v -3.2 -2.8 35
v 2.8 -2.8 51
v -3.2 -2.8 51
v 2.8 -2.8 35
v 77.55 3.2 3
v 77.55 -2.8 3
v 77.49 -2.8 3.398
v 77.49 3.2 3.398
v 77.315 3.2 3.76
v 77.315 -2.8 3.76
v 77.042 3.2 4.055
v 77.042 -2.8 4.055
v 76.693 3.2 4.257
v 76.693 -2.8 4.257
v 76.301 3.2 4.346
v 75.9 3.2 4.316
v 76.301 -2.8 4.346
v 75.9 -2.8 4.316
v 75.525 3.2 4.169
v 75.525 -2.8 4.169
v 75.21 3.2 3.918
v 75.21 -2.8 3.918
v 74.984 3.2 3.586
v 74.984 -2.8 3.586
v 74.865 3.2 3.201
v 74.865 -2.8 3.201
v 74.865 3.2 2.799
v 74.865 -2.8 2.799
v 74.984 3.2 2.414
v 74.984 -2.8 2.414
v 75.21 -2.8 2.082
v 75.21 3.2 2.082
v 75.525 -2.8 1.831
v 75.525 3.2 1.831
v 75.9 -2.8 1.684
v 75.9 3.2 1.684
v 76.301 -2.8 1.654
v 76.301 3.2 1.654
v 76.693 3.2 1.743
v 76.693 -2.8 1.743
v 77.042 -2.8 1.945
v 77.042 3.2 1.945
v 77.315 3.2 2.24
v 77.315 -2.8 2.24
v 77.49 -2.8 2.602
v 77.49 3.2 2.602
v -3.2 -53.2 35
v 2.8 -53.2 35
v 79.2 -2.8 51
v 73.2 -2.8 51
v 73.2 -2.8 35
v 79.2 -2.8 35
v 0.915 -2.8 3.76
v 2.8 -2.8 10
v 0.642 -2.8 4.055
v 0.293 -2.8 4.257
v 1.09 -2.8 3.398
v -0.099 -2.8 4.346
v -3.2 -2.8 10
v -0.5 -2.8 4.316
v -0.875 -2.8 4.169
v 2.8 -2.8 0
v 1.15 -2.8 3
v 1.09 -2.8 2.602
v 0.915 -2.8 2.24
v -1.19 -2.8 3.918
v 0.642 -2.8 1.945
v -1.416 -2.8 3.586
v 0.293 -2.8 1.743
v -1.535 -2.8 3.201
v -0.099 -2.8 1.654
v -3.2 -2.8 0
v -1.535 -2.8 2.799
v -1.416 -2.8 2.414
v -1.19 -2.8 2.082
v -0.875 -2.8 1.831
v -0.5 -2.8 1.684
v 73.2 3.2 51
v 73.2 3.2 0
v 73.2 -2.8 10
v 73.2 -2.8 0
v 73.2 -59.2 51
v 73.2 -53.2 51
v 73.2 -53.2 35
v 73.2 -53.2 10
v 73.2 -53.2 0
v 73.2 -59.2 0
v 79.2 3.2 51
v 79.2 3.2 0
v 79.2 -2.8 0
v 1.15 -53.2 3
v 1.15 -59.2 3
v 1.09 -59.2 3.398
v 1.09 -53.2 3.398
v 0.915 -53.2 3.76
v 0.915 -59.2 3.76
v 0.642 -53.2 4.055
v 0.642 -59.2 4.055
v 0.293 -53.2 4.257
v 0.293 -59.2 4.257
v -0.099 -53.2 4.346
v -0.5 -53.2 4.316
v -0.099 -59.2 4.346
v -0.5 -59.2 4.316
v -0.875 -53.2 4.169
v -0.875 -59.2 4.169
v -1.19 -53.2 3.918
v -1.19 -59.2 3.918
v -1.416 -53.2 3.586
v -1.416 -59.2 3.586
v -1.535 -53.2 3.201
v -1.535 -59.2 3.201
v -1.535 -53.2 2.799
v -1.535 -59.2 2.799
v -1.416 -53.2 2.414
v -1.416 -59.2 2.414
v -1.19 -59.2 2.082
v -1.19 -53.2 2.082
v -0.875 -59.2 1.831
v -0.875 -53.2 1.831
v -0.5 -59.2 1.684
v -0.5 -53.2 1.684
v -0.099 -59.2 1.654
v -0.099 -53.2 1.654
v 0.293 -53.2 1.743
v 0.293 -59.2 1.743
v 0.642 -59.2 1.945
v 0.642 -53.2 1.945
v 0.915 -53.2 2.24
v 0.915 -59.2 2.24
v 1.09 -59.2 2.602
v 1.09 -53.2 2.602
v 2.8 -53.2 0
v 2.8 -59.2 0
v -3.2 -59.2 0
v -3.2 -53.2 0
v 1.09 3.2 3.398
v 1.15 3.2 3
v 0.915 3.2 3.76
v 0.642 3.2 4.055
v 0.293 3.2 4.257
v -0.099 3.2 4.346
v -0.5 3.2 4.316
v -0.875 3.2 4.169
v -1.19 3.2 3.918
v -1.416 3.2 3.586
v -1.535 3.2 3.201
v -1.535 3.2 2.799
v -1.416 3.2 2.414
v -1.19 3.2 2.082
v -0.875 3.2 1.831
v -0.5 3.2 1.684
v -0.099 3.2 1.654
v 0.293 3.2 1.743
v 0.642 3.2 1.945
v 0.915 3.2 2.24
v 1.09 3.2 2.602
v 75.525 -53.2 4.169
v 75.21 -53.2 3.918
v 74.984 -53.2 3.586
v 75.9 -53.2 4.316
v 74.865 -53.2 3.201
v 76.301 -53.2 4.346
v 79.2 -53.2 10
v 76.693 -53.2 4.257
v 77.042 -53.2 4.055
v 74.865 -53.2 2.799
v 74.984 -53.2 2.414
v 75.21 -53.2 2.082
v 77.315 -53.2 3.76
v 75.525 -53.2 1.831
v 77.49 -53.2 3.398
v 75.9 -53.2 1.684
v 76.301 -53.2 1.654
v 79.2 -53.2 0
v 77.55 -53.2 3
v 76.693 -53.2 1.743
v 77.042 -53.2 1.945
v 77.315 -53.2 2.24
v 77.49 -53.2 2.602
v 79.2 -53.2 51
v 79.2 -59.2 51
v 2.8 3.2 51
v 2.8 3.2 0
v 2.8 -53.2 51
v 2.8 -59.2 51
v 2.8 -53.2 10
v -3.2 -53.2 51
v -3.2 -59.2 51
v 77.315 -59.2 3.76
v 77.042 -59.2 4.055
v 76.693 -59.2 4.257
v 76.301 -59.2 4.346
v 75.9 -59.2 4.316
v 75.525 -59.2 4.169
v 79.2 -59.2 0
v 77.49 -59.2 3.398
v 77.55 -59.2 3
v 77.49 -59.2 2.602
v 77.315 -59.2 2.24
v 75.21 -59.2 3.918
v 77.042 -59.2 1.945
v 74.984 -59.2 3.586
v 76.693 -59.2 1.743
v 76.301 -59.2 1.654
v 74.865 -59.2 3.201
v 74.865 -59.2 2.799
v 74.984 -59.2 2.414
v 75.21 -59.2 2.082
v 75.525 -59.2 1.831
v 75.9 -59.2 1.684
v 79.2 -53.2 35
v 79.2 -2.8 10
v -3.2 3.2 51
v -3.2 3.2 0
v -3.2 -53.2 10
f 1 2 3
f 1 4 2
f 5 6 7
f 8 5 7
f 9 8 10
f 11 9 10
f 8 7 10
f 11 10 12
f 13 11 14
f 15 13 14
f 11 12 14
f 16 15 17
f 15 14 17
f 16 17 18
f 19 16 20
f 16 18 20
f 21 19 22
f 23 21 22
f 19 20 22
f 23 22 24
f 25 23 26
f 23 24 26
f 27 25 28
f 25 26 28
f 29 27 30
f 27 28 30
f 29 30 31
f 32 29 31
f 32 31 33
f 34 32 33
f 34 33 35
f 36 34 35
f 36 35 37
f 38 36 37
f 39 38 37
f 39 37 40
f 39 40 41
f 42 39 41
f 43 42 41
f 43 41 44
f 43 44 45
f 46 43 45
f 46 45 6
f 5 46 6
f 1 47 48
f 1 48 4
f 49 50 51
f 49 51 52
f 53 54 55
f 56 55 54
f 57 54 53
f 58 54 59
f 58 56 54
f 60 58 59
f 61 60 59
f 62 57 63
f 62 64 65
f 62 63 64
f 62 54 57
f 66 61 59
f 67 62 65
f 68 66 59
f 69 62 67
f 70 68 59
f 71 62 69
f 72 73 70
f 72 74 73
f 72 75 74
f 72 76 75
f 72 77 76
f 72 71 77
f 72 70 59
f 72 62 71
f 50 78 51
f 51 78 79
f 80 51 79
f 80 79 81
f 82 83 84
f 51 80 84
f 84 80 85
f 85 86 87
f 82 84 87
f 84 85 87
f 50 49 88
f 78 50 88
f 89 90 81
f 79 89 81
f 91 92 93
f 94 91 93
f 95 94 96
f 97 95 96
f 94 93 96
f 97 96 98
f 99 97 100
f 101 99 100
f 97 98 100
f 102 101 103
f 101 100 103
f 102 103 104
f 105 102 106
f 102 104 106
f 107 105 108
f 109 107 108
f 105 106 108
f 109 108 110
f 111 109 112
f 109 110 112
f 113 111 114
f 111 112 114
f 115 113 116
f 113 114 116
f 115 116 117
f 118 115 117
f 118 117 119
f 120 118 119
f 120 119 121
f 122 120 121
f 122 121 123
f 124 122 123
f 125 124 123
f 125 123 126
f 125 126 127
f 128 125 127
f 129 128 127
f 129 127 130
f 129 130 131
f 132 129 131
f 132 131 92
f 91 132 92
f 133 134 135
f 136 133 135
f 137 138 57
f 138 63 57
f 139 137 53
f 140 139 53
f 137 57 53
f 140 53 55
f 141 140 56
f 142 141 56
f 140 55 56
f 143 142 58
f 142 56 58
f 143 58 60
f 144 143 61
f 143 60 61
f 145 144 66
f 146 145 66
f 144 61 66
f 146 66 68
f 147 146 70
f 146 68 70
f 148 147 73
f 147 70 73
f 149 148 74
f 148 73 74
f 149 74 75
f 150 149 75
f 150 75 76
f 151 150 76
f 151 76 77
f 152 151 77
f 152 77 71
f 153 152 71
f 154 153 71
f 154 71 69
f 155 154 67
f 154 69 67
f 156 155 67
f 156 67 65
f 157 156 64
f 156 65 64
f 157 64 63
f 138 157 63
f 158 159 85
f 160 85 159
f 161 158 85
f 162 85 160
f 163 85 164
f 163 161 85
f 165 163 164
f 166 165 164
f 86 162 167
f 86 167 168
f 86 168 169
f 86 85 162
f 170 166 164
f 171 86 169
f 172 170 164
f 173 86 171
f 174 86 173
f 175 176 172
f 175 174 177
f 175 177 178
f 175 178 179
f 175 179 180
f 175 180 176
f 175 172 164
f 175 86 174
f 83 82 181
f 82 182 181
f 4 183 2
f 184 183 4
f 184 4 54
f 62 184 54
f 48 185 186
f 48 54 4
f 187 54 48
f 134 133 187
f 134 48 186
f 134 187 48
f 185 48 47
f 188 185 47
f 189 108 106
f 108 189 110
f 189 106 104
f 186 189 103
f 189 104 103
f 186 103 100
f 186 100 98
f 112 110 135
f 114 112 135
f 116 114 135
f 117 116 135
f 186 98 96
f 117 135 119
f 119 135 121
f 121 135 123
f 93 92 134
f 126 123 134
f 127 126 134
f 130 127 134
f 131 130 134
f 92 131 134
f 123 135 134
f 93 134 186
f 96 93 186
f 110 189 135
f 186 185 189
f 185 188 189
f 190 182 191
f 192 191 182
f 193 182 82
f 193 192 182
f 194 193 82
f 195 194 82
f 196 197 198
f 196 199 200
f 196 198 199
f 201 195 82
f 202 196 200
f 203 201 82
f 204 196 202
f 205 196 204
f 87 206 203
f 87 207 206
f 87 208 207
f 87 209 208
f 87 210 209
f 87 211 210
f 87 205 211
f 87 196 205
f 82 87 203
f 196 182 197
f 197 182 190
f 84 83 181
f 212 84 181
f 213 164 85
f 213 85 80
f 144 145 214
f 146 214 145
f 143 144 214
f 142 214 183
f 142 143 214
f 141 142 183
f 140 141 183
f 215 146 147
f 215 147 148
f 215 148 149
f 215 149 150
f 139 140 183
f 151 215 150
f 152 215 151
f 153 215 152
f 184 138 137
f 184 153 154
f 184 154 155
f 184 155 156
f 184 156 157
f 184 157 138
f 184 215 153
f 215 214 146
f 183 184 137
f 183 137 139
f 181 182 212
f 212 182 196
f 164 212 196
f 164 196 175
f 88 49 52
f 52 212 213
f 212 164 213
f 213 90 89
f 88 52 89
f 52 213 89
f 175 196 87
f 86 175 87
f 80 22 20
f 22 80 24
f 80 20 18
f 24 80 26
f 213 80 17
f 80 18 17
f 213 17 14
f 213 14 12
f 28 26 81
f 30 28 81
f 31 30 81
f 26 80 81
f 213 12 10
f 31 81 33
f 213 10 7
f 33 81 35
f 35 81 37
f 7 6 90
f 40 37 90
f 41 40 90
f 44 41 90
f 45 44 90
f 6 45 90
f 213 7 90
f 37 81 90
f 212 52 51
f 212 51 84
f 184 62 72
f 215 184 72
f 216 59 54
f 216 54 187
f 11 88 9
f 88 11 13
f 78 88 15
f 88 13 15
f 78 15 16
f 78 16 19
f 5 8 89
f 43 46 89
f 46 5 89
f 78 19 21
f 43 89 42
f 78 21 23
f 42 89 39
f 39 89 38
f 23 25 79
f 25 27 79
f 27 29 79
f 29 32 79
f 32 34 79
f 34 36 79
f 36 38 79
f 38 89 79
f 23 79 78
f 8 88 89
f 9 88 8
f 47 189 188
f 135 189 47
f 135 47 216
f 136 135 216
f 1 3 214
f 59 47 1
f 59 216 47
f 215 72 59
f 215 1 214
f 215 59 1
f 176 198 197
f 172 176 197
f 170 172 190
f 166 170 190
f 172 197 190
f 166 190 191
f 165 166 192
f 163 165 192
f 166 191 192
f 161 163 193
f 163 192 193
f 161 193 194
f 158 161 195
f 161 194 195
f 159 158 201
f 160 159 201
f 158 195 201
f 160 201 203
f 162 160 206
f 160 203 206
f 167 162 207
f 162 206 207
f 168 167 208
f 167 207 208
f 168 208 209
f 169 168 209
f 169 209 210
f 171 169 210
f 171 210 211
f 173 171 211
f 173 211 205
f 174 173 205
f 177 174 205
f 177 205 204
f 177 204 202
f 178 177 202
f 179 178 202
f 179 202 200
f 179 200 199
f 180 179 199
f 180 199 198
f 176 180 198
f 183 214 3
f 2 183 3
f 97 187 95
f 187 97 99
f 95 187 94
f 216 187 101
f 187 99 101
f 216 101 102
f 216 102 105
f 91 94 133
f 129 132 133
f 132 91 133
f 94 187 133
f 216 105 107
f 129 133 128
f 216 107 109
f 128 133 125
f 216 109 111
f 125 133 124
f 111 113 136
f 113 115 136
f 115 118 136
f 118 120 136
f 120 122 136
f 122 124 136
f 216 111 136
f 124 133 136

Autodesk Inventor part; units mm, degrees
ref_plane "YZ Plane" through (0, 0, 0) normal (1, 0, 0) x (0, 1, 0)
ref_plane "XZ Plane" through (0, 0, 0) normal (0, 1, 0) x (-1, 0, 0)
ref_plane "XY Plane" through (0, 0, 0) normal (0, 0, 1) x (1, 0, 0)
sketch "스케치1" plane through (0, 0, 0) normal (0, 0, 1) x (1, 0, 0)
  circle A0 centre (7.2, -7.2) radius 1.6 projected
  circle A1 centre (68.8, -7.2) radius 1.6 projected
  circle A2 centre (7.2, -48.8) radius 1.6 projected
  circle A3 centre (68.8, -48.8) radius 1.6 projected
  line L0 (73, -3) -> (3, -3) projected
  line L1 (3, -3) -> (3, -53) projected
  line L2 (3, -53) -> (73, -53) projected
  line L3 (73, -53) -> (73, -3) projected
  line L4 (22.5584, -24.5391) -> (23.3691, -24.5391) projected
  line L5 (23.3691, -24.5391) -> (23.3691, -29.9174) projected
  line L6 (23.3691, -29.9174) -> (25.4156, -29.9174) projected
  line L7 (25.4156, -29.9174) -> (25.4156, -30.6391) projected
  line L8 (25.4156, -30.6391) -> (20.5118, -30.6391) projected
  line L9 (20.5118, -30.6391) -> (20.5118, -29.9174) projected
  line L10 (20.5118, -29.9174) -> (22.5584, -29.9174) projected
  line L11 (22.5584, -29.9174) -> (22.5584, -24.5391) projected
  spline S0 degree 2 poles (29.6668, -24.9741) (29.9584, -24.6874) (30.7296, -24.4106) (31.2931, -24.4106) knots 0 0 0 1 2 2 2 projected
  spline S1 degree 2 poles (31.2931, -24.4106) (31.8319, -24.4106) (32.6328, -24.6924) (32.9145, -24.9741) knots 0 0 0 1 2 2 2 projected
  spline S2 degree 2 poles (32.9145, -24.9741) (33.2358, -25.2905) (33.4978, -26.1803) (33.4978, -26.8328) knots 0 0 0 1 2 2 2 projected
  line L12 (33.4978, -26.8328) -> (33.4978, -30.6391) projected
  line L13 (33.4978, -30.6391) -> (32.6871, -30.6391) projected
  line L14 (32.6871, -30.6391) -> (32.6871, -26.8328) projected
  spline S3 degree 2 poles (32.6871, -26.8328) (32.6871, -26.4077) (32.5784, -25.8343) (32.4251, -25.6019) knots 0 0 0 1 2 2 2 projected
  spline S4 degree 2 poles (32.4251, -25.6019) (32.262, -25.3548) (31.6985, -25.1027) (31.2931, -25.1027) knots 0 0 0 1 2 2 2 projected
  spline S5 degree 2 poles (31.2931, -25.1027) (30.9125, -25.1027) (30.3193, -25.3548) (30.1562, -25.6019) knots 0 0 0 1 2 2 2 projected
  spline S6 degree 2 poles (30.1562, -25.6019) (30.0029, -25.8343) (29.8942, -26.4028) (29.8942, -26.813) knots 0 0 0 1 2 2 2 projected
  line L15 (29.8942, -26.813) -> (29.8942, -30.6391) projected
  line L16 (29.8942, -30.6391) -> (29.0835, -30.6391) projected
  line L17 (29.0835, -30.6391) -> (29.0835, -26.8328) projected
  spline S7 degree 2 poles (29.0835, -26.8328) (29.0835, -26.1951) (29.3405, -25.2856) (29.6668, -24.9741) knots 0 0 0 1 2 2 2 projected
  line L18 (44.6696, -25.162) -> (44.6696, -24.5391) projected
  line L19 (44.6696, -24.5391) -> (47.0325, -24.5391) projected
  line L20 (47.0325, -24.5391) -> (47.0325, -25.162) projected
  line L21 (47.0325, -25.162) -> (46.2564, -25.162) projected
  line L22 (46.2564, -25.162) -> (46.2564, -30.0163) projected
  line L23 (46.2564, -30.0163) -> (47.0325, -30.0163) projected
  line L24 (47.0325, -30.0163) -> (47.0325, -30.6391) projected
  line L25 (47.0325, -30.6391) -> (44.6696, -30.6391) projected
  line L26 (44.6696, -30.6391) -> (44.6696, -30.0163) projected
  line L27 (44.6696, -30.0163) -> (45.4457, -30.0163) projected
  line L28 (45.4457, -30.0163) -> (45.4457, -25.162) projected
  line L29 (45.4457, -25.162) -> (44.6696, -25.162) projected
  spline S8 degree 2 poles (48.3623, -24.6083) (48.6292, -24.5194) (49.084, -24.4304) (49.4498, -24.4304) knots 0 0 0 1 2 2 2 projected
  spline S9 degree 2 poles (49.4498, -24.4304) (50.043, -24.4304) (51.0464, -24.8308) (51.4123, -25.2312) knots 0 0 0 1 2 2 2 projected
  spline S10 degree 2 poles (51.4123, -25.2312) (51.7781, -25.6267) (52.1785, -26.813) (52.1785, -27.5842) knots 0 0 0 1 2 2 2 projected
  spline S11 degree 2 poles (52.1785, -27.5842) (52.1785, -28.3504) (51.7879, -29.4874) (51.4172, -29.9075) knots 0 0 0 1 2 2 2 projected
  spline S12 degree 2 poles (51.4172, -29.9075) (51.0514, -30.3178) (50.0529, -30.7479) (49.4349, -30.7479) knots 0 0 0 1 2 2 2 projected
  spline S13 degree 2 poles (49.4349, -30.7479) (49.1285, -30.7479) (48.5896, -30.6589) (48.3623, -30.5897) knots 0 0 0 1 2 2 2 projected
  spline S14 degree 2 poles (48.3623, -30.5897) (48.1645, -30.5254) (47.7542, -30.3425) (47.5516, -30.2338) knots 0 0 0 1 2 2 2 projected
  line L30 (47.5516, -30.2338) -> (47.5516, -29.255) projected
  line L31 (47.5516, -29.255) -> (47.6158, -29.255) projected
  spline S15 degree 2 poles (47.6158, -29.255) (47.7246, -29.3539) (48.0607, -29.6307) (48.3029, -29.7642) knots 0 0 0 1 2 2 2 projected
  spline S16 degree 2 poles (48.3029, -29.7642) (48.5353, -29.8927) (49.084, -30.0558) (49.4399, -30.0558) knots 0 0 0 1 2 2 2 projected
  spline S17 degree 2 poles (49.4399, -30.0558) (49.8304, -30.0558) (50.5274, -29.7345) (50.7894, -29.428) knots 0 0 0 1 2 2 2 projected
  spline S18 degree 2 poles (50.7894, -29.428) (51.0464, -29.1166) (51.3332, -28.1724) (51.3332, -27.5842) knots 0 0 0 1 2 2 2 projected
  spline S19 degree 2 poles (51.3332, -27.5842) (51.3332, -26.9564) (51.0316, -26.0518) (50.7696, -25.7404) knots 0 0 0 1 2 2 2 projected
  spline S20 degree 2 poles (50.7696, -25.7404) (50.5126, -25.4388) (49.8255, -25.1323) (49.4399, -25.1323) knots 0 0 0 1 2 2 2 projected
  spline S21 degree 2 poles (49.4399, -25.1323) (49.0889, -25.1323) (48.4908, -25.3053) (48.2584, -25.4339) knots 0 0 0 1 2 2 2 projected
  spline S22 degree 2 poles (48.2584, -25.4339) (48.036, -25.5624) (47.7048, -25.8293) (47.6109, -25.9233) knots 0 0 0 1 2 2 2 projected
  line L32 (47.6109, -25.9233) -> (47.5516, -25.9233) projected
  line L33 (47.5516, -25.9233) -> (47.5516, -24.9544) projected
  spline S23 degree 2 poles (47.5516, -24.9544) (47.7542, -24.8604) (48.1101, -24.6874) (48.3623, -24.6083) knots 0 0 0 1 2 2 2 projected
  line L34 (41.1154, -27.1937) -> (38.9453, -24.5391) projected
  line L35 (38.9453, -24.5391) -> (39.9982, -24.5391) projected
  line L36 (39.9982, -24.5391) -> (41.9261, -26.9663) projected
  line L37 (41.9261, -26.9663) -> (42.8554, -26.9663) projected
  line L38 (42.8554, -26.9663) -> (42.8554, -24.5391) projected
  line L39 (42.8554, -24.5391) -> (43.6661, -24.5391) projected
  line L40 (43.6661, -24.5391) -> (43.6661, -30.6391) projected
  line L41 (43.6661, -30.6391) -> (42.0942, -30.6391) projected
  spline S24 degree 2 poles (42.0942, -30.6391) (41.5702, -30.6391) (40.8633, -30.5254) (40.542, -30.3178) knots 0 0 0 1 2 2 2 projected
  spline S25 degree 2 poles (40.542, -30.3178) (40.2207, -30.1102) (39.8499, -29.4626) (39.8499, -28.9831) knots 0 0 0 1 2 2 2 projected
  spline S26 degree 2 poles (39.8499, -28.9831) (39.8499, -28.3158) (40.5321, -27.4112) (41.1154, -27.1937) knots 0 0 0 1 2 2 2 projected
  spline S27 degree 2 poles (34.9907, -24.6083) (35.2576, -24.5194) (35.7124, -24.4304) (36.0782, -24.4304) knots 0 0 0 1 2 2 2 projected
  spline S28 degree 2 poles (36.0782, -24.4304) (36.6714, -24.4304) (37.6749, -24.8308) (38.0407, -25.2312) knots 0 0 0 1 2 2 2 projected
  spline S29 degree 2 poles (38.0407, -25.2312) (38.4065, -25.6267) (38.8069, -26.813) (38.8069, -27.5842) knots 0 0 0 1 2 2 2 projected
  spline S30 degree 2 poles (38.8069, -27.5842) (38.8069, -28.3504) (38.4164, -29.4874) (38.0456, -29.9075) knots 0 0 0 1 2 2 2 projected
  spline S31 degree 2 poles (38.0456, -29.9075) (37.6798, -30.3178) (36.6813, -30.7479) (36.0634, -30.7479) knots 0 0 0 1 2 2 2 projected
  spline S32 degree 2 poles (36.0634, -30.7479) (35.7569, -30.7479) (35.2181, -30.6589) (34.9907, -30.5897) knots 0 0 0 1 2 2 2 projected
  spline S33 degree 2 poles (34.9907, -30.5897) (34.793, -30.5254) (34.3827, -30.3425) (34.18, -30.2338) knots 0 0 0 1 2 2 2 projected
  line L42 (34.18, -30.2338) -> (34.18, -29.255) projected
  line L43 (34.18, -29.255) -> (34.2443, -29.255) projected
  spline S34 degree 2 poles (34.2443, -29.255) (34.353, -29.3539) (34.6892, -29.6307) (34.9314, -29.7642) knots 0 0 0 1 2 2 2 projected
  spline S35 degree 2 poles (34.9314, -29.7642) (35.1637, -29.8927) (35.7124, -30.0558) (36.0683, -30.0558) knots 0 0 0 1 2 2 2 projected
  spline S36 degree 2 poles (36.0683, -30.0558) (36.4588, -30.0558) (37.1558, -29.7345) (37.4178, -29.428) knots 0 0 0 1 2 2 2 projected
  spline S37 degree 2 poles (37.4178, -29.428) (37.6749, -29.1166) (37.9616, -28.1724) (37.9616, -27.5842) knots 0 0 0 1 2 2 2 projected
  spline S38 degree 2 poles (37.9616, -27.5842) (37.9616, -26.9564) (37.6601, -26.0518) (37.3981, -25.7404) knots 0 0 0 1 2 2 2 projected
  spline S39 degree 2 poles (37.3981, -25.7404) (37.141, -25.4388) (36.4539, -25.1323) (36.0683, -25.1323) knots 0 0 0 1 2 2 2 projected
  spline S40 degree 2 poles (36.0683, -25.1323) (35.7174, -25.1323) (35.1192, -25.3053) (34.8869, -25.4339) knots 0 0 0 1 2 2 2 projected
  spline S41 degree 2 poles (34.8869, -25.4339) (34.6644, -25.5624) (34.3332, -25.8293) (34.2393, -25.9233) knots 0 0 0 1 2 2 2 projected
  line L44 (34.2393, -25.9233) -> (34.18, -25.9233) projected
  line L45 (34.18, -25.9233) -> (34.18, -24.9544) projected
  spline S42 degree 2 poles (34.18, -24.9544) (34.3827, -24.8604) (34.7386, -24.6874) (34.9907, -24.6083) knots 0 0 0 1 2 2 2 projected
  line L46 (25.7962, -25.162) -> (25.7962, -24.5391) projected
  line L47 (25.7962, -24.5391) -> (28.1591, -24.5391) projected
  line L48 (28.1591, -24.5391) -> (28.1591, -25.162) projected
  line L49 (28.1591, -25.162) -> (27.383, -25.162) projected
  line L50 (27.383, -25.162) -> (27.383, -30.0163) projected
  line L51 (27.383, -30.0163) -> (28.1591, -30.0163) projected
  line L52 (28.1591, -30.0163) -> (28.1591, -30.6391) projected
  line L53 (28.1591, -30.6391) -> (25.7962, -30.6391) projected
  line L54 (25.7962, -30.6391) -> (25.7962, -30.0163) projected
  line L55 (25.7962, -30.0163) -> (26.5723, -30.0163) projected
  line L56 (26.5723, -30.0163) -> (26.5723, -25.162) projected
  line L57 (26.5723, -25.162) -> (25.7962, -25.162) projected
  line L58 (79.2, 3.2) -> (73.2, 3.2)
  line L59 (73.2, 3.2) -> (73.2, -2.8)
  line L60 (73.2, -2.8) -> (79.2, -2.8)
  line L61 (79.2, -2.8) -> (79.2, 3.2)
  line L62 (79.2, -59.2) -> (73.2, -59.2)
  line L63 (73.2, -59.2) -> (73.2, -53.2)
  line L64 (73.2, -53.2) -> (79.2, -53.2)
  line L65 (79.2, -53.2) -> (79.2, -59.2)
  line L66 (-3.2, 3.2) -> (2.8, 3.2)
  line L67 (2.8, 3.2) -> (2.8, -2.8)
  line L68 (2.8, -2.8) -> (-3.2, -2.8)
  line L69 (-3.2, -2.8) -> (-3.2, 3.2)
  line L70 (-3.2, -59.2) -> (2.8, -59.2)
  line L71 (2.8, -59.2) -> (2.8, -53.2)
  line L72 (2.8, -53.2) -> (-3.2, -53.2)
  line L73 (-3.2, -53.2) -> (-3.2, -59.2)
  line L74 (67.1, -22.175) -> (67.1, -28.175) projected
  line L75 (67.1, -28.175) -> (61.1, -28.175) projected
  line L76 (61.1, -28.175) -> (61.1, -22.175) projected
  line L77 (61.1, -22.175) -> (67.1, -22.175) projected
  circle A4 centre (7.2, -7.2) radius 1.6 projected
  circle A5 centre (68.8, -7.2) radius 1.6 projected
  circle A6 centre (7.2, -48.8) radius 1.6 projected
  circle A7 centre (68.8, -48.8) radius 1.6 projected
  line L78 (8.9, -22.175) -> (14.9, -22.175) projected
  line L79 (14.9, -22.175) -> (14.9, -28.175) projected
  line L80 (14.9, -28.175) -> (8.9, -28.175) projected
  line L81 (8.9, -28.175) -> (8.9, -22.175) projected
  line L82 (-3.2, -2.8) -> (-3.2, -53.2) projected
  line L83 (-3.2, -53.2) -> (2.8, -53.2) projected
  line L84 (2.8, -53.2) -> (2.8, -59.2) projected
  line L85 (2.8, -59.2) -> (73.2, -59.2) projected
  line L86 (73.2, -59.2) -> (73.2, -53.2) projected
  line L87 (73.2, -53.2) -> (79.2, -53.2) projected
  line L88 (79.2, -53.2) -> (79.2, -2.8) projected
  line L89 (79.2, -2.8) -> (73.2, -2.8) projected
  line L90 (73.2, -2.8) -> (73.2, 3.2) projected
  line L91 (73.2, 3.2) -> (2.8, 3.2) projected
  line L92 (2.8, 3.2) -> (2.8, -2.8) projected
  line L93 (2.8, -2.8) -> (-3.2, -2.8) projected
  point P0 (0, 0)
  dimension "d0" = 6
  dimension "d1" = 6
  dimension "d2" = 6
  dimension "d3" = 6
  dimension "d4" = 6
  dimension "d5" = 6
  dimension "d6" = 6
  dimension "d7" = 6
extrude "돌출1" add sketch "스케치1" along normal blind 45 contours L61 L60 L59 L58 | L67 L68 L69 L66 | L65 L62 L63 L64 | L72 L71 L70 L73
sketch "스케치2" plane through (79.2, -59.2, 0) normal (1, 0, 0) x (0, 0, -1)
  line L0 (-45, 0) -> (-45, 6) projected
  line L1 (-45, 6) -> (-51, 6) projected
  line L2 (-51, 0) -> (-51, 6) projected
  line L3 (-45, 0) -> (-51, 0) projected
  line L4 (-45, 56.4) -> (-45, 62.4) projected
  line L5 (-45, 62.4) -> (-51, 62.4) projected
  line L6 (-51, 56.4) -> (-51, 62.4) projected
  line L7 (-45, 56.4) -> (-51, 56.4) projected
  line L8 (6, 56.4) -> (6, 62.4) projected
  line L9 (6, 62.4) -> (0, 62.4) projected
  line L10 (0, 56.4) -> (0, 62.4) projected
  line L11 (6, 56.4) -> (0, 56.4) projected
  line L12 (6, 0) -> (6, 6) projected
  line L13 (6, 6) -> (0, 6) projected
  line L14 (0, 0) -> (0, 6) projected
  line L15 (6, 0) -> (0, 0) projected
  line L16 (0, 6) -> (0, 56.4) projected
  line L17 (-45, 6) -> (-45, 56.4) projected
  point P0 (0, 59.2)
extrude "돌출2" add sketch "스케치2" against normal blind 6
sketch "스케치3" plane through (-3.2, -2.8, 0) normal (-1, 0, 0) x (0, 0, 1)
  line L0 (45, 6) -> (45, 0) projected
  line L1 (45, 0) -> (51, 0) projected
  line L2 (51, 6) -> (51, 0) projected
  line L3 (45, 6) -> (51, 6) projected
  line L4 (45, -50.4) -> (45, -56.4) projected
  line L5 (45, -56.4) -> (51, -56.4) projected
  line L6 (51, -50.4) -> (51, -56.4) projected
  line L7 (45, -50.4) -> (51, -50.4) projected
  line L8 (-6, -50.4) -> (-6, -56.4) projected
  line L9 (-6, -56.4) -> (0, -56.4) projected
  line L10 (0, -50.4) -> (0, -56.4) projected
  line L11 (-6, -50.4) -> (0, -50.4) projected
  line L12 (-6, 6) -> (-6, 0) projected
  line L13 (-6, 0) -> (0, 0) projected
  line L14 (0, 6) -> (0, 0) projected
  line L15 (-6, 6) -> (0, 6) projected
  point P0 (0, 2.8)
extrude "돌출3" add sketch "스케치3" against normal blind 6
sketch "스케치4" plane through (-3.2, -2.8, 51) normal (-1, 0, 0) x (0, 0, 1)
  line L0 (-57, 0) -> (0, 0) projected
  line L1 (-57, -50.4) -> (0, -50.4) projected
  line L2 (-16, 0) -> (-41, 0)
  line L3 (-41, 0) -> (-41, -50.4)
  line L4 (-41, -50.4) -> (-16, -50.4)
  line L5 (-16, -50.4) -> (-16, 0)
  point P0 (-51, 2.8)
  point P1 (-16, -50.4)
  point P2 (-41, 0)
extrude "돌출4" add sketch "스케치4" against normal blind 6
sketch "스케치6" plane through (79.2, -59.2, 51) normal (1, 0, 0) x (0, 0, -1)
  line L0 (57, 6) -> (0, 6) projected
  line L1 (57, 56.4) -> (41, 56.4) projected
  line L2 (16, 6) -> (41, 6)
  line L3 (41, 6) -> (41, 56.4)
  line L4 (41, 56.4) -> (16, 56.4)
  line L5 (16, 56.4) -> (16, 6)
  point P0 (51, 59.2)
  point P1 (41, 6)
extrude "돌출5" add sketch "스케치6" against normal blind 6
sketch "스케치8" plane through (-3.2, -59.2, -6) normal (0, -1, 0) x (1, 0, 0)
  line L0 (0, 0) -> (0, 57) projected
  line L1 (6, 0) -> (6, 57) projected
  line L2 (0, 0) -> (6, 0)
  line L3 (6, 0) -> (6, 6)
  line L4 (6, 6) -> (0, 6)
  line L5 (0, 6) -> (0, 0)
  circle A0 centre (3, 3) radius 1.3
  line L6 (76.4, 0) -> (76.4, 57) projected
  line L7 (82.4, 0) -> (82.4, 57) projected
  line L8 (76.4, 0) -> (82.4, 0)
  line L9 (82.4, 0) -> (82.4, 6)
  line L10 (82.4, 6) -> (76.4, 6)
  line L11 (76.4, 6) -> (76.4, 0)
  circle A1 centre (79.4, 3) radius 1.3
  point P0 (3.2, 6)
  dimension "d18" = 2.6
  dimension "d19" = 2.6
extrude "돌출6" cut sketch "스케치8" against normal up to next contours A0 | A1
sketch "스케치10" plane through (-3.2, -59.2, -6) normal (0, -1, 0) x (1, 0, 0)
  line L0 (0, 0) -> (0, 16) projected
  line L1 (6, 0) -> (6, 16) projected
  line L2 (0, 0) -> (6, 0)
  line L3 (6, 0) -> (6, 6)
  line L4 (6, 6) -> (0, 6)
  line L5 (0, 6) -> (0, 0)
  line L6 (82.4, 0) -> (76.4, 0) projected
  line L7 (82.4, 0) -> (82.4, 57) projected
  line L8 (76.4, 0) -> (82.4, 0)
  line L9 (82.4, 0) -> (82.4, 6)
  line L10 (82.4, 6) -> (76.4, 6)
  line L11 (76.4, 6) -> (76.4, 0)
  point P0 (3.2, 6)
extrude "돌출7" cut sketch "스케치10" against normal through all
sketch "스케치11" plane through (-3.2, -59.2, 51) normal (0, -1, 0) x (1, 0, 0)
  line L0 (0, -51) -> (0, 0) projected
  line L1 (6, -51) -> (6, -41) projected
  line L2 (0, -51) -> (6, -51)
  line L3 (6, -51) -> (6, -45)
  line L4 (6, -45) -> (0, -45)
  line L5 (0, -45) -> (0, -51)
  circle A0 centre (3, -48) radius 1.35
  line L6 (82.4, -51) -> (82.4, 0) projected
  line L7 (76.4, -51) -> (76.4, 0) projected
  line L8 (82.4, -51) -> (76.4, -51)
  line L9 (76.4, -51) -> (76.4, -45)
  line L10 (76.4, -45) -> (82.4, -45)
  line L11 (82.4, -45) -> (82.4, -51)
  circle A1 centre (79.4, -48) radius 1.35
  point P0 (3.2, -51)
  dimension "d24" = 2.7
  dimension "d25" = 2.7
extrude "돌출8" cut sketch "스케치11" against normal through all contours A0 | A1
properties part number "c" material "PMMA 플라스틱"
